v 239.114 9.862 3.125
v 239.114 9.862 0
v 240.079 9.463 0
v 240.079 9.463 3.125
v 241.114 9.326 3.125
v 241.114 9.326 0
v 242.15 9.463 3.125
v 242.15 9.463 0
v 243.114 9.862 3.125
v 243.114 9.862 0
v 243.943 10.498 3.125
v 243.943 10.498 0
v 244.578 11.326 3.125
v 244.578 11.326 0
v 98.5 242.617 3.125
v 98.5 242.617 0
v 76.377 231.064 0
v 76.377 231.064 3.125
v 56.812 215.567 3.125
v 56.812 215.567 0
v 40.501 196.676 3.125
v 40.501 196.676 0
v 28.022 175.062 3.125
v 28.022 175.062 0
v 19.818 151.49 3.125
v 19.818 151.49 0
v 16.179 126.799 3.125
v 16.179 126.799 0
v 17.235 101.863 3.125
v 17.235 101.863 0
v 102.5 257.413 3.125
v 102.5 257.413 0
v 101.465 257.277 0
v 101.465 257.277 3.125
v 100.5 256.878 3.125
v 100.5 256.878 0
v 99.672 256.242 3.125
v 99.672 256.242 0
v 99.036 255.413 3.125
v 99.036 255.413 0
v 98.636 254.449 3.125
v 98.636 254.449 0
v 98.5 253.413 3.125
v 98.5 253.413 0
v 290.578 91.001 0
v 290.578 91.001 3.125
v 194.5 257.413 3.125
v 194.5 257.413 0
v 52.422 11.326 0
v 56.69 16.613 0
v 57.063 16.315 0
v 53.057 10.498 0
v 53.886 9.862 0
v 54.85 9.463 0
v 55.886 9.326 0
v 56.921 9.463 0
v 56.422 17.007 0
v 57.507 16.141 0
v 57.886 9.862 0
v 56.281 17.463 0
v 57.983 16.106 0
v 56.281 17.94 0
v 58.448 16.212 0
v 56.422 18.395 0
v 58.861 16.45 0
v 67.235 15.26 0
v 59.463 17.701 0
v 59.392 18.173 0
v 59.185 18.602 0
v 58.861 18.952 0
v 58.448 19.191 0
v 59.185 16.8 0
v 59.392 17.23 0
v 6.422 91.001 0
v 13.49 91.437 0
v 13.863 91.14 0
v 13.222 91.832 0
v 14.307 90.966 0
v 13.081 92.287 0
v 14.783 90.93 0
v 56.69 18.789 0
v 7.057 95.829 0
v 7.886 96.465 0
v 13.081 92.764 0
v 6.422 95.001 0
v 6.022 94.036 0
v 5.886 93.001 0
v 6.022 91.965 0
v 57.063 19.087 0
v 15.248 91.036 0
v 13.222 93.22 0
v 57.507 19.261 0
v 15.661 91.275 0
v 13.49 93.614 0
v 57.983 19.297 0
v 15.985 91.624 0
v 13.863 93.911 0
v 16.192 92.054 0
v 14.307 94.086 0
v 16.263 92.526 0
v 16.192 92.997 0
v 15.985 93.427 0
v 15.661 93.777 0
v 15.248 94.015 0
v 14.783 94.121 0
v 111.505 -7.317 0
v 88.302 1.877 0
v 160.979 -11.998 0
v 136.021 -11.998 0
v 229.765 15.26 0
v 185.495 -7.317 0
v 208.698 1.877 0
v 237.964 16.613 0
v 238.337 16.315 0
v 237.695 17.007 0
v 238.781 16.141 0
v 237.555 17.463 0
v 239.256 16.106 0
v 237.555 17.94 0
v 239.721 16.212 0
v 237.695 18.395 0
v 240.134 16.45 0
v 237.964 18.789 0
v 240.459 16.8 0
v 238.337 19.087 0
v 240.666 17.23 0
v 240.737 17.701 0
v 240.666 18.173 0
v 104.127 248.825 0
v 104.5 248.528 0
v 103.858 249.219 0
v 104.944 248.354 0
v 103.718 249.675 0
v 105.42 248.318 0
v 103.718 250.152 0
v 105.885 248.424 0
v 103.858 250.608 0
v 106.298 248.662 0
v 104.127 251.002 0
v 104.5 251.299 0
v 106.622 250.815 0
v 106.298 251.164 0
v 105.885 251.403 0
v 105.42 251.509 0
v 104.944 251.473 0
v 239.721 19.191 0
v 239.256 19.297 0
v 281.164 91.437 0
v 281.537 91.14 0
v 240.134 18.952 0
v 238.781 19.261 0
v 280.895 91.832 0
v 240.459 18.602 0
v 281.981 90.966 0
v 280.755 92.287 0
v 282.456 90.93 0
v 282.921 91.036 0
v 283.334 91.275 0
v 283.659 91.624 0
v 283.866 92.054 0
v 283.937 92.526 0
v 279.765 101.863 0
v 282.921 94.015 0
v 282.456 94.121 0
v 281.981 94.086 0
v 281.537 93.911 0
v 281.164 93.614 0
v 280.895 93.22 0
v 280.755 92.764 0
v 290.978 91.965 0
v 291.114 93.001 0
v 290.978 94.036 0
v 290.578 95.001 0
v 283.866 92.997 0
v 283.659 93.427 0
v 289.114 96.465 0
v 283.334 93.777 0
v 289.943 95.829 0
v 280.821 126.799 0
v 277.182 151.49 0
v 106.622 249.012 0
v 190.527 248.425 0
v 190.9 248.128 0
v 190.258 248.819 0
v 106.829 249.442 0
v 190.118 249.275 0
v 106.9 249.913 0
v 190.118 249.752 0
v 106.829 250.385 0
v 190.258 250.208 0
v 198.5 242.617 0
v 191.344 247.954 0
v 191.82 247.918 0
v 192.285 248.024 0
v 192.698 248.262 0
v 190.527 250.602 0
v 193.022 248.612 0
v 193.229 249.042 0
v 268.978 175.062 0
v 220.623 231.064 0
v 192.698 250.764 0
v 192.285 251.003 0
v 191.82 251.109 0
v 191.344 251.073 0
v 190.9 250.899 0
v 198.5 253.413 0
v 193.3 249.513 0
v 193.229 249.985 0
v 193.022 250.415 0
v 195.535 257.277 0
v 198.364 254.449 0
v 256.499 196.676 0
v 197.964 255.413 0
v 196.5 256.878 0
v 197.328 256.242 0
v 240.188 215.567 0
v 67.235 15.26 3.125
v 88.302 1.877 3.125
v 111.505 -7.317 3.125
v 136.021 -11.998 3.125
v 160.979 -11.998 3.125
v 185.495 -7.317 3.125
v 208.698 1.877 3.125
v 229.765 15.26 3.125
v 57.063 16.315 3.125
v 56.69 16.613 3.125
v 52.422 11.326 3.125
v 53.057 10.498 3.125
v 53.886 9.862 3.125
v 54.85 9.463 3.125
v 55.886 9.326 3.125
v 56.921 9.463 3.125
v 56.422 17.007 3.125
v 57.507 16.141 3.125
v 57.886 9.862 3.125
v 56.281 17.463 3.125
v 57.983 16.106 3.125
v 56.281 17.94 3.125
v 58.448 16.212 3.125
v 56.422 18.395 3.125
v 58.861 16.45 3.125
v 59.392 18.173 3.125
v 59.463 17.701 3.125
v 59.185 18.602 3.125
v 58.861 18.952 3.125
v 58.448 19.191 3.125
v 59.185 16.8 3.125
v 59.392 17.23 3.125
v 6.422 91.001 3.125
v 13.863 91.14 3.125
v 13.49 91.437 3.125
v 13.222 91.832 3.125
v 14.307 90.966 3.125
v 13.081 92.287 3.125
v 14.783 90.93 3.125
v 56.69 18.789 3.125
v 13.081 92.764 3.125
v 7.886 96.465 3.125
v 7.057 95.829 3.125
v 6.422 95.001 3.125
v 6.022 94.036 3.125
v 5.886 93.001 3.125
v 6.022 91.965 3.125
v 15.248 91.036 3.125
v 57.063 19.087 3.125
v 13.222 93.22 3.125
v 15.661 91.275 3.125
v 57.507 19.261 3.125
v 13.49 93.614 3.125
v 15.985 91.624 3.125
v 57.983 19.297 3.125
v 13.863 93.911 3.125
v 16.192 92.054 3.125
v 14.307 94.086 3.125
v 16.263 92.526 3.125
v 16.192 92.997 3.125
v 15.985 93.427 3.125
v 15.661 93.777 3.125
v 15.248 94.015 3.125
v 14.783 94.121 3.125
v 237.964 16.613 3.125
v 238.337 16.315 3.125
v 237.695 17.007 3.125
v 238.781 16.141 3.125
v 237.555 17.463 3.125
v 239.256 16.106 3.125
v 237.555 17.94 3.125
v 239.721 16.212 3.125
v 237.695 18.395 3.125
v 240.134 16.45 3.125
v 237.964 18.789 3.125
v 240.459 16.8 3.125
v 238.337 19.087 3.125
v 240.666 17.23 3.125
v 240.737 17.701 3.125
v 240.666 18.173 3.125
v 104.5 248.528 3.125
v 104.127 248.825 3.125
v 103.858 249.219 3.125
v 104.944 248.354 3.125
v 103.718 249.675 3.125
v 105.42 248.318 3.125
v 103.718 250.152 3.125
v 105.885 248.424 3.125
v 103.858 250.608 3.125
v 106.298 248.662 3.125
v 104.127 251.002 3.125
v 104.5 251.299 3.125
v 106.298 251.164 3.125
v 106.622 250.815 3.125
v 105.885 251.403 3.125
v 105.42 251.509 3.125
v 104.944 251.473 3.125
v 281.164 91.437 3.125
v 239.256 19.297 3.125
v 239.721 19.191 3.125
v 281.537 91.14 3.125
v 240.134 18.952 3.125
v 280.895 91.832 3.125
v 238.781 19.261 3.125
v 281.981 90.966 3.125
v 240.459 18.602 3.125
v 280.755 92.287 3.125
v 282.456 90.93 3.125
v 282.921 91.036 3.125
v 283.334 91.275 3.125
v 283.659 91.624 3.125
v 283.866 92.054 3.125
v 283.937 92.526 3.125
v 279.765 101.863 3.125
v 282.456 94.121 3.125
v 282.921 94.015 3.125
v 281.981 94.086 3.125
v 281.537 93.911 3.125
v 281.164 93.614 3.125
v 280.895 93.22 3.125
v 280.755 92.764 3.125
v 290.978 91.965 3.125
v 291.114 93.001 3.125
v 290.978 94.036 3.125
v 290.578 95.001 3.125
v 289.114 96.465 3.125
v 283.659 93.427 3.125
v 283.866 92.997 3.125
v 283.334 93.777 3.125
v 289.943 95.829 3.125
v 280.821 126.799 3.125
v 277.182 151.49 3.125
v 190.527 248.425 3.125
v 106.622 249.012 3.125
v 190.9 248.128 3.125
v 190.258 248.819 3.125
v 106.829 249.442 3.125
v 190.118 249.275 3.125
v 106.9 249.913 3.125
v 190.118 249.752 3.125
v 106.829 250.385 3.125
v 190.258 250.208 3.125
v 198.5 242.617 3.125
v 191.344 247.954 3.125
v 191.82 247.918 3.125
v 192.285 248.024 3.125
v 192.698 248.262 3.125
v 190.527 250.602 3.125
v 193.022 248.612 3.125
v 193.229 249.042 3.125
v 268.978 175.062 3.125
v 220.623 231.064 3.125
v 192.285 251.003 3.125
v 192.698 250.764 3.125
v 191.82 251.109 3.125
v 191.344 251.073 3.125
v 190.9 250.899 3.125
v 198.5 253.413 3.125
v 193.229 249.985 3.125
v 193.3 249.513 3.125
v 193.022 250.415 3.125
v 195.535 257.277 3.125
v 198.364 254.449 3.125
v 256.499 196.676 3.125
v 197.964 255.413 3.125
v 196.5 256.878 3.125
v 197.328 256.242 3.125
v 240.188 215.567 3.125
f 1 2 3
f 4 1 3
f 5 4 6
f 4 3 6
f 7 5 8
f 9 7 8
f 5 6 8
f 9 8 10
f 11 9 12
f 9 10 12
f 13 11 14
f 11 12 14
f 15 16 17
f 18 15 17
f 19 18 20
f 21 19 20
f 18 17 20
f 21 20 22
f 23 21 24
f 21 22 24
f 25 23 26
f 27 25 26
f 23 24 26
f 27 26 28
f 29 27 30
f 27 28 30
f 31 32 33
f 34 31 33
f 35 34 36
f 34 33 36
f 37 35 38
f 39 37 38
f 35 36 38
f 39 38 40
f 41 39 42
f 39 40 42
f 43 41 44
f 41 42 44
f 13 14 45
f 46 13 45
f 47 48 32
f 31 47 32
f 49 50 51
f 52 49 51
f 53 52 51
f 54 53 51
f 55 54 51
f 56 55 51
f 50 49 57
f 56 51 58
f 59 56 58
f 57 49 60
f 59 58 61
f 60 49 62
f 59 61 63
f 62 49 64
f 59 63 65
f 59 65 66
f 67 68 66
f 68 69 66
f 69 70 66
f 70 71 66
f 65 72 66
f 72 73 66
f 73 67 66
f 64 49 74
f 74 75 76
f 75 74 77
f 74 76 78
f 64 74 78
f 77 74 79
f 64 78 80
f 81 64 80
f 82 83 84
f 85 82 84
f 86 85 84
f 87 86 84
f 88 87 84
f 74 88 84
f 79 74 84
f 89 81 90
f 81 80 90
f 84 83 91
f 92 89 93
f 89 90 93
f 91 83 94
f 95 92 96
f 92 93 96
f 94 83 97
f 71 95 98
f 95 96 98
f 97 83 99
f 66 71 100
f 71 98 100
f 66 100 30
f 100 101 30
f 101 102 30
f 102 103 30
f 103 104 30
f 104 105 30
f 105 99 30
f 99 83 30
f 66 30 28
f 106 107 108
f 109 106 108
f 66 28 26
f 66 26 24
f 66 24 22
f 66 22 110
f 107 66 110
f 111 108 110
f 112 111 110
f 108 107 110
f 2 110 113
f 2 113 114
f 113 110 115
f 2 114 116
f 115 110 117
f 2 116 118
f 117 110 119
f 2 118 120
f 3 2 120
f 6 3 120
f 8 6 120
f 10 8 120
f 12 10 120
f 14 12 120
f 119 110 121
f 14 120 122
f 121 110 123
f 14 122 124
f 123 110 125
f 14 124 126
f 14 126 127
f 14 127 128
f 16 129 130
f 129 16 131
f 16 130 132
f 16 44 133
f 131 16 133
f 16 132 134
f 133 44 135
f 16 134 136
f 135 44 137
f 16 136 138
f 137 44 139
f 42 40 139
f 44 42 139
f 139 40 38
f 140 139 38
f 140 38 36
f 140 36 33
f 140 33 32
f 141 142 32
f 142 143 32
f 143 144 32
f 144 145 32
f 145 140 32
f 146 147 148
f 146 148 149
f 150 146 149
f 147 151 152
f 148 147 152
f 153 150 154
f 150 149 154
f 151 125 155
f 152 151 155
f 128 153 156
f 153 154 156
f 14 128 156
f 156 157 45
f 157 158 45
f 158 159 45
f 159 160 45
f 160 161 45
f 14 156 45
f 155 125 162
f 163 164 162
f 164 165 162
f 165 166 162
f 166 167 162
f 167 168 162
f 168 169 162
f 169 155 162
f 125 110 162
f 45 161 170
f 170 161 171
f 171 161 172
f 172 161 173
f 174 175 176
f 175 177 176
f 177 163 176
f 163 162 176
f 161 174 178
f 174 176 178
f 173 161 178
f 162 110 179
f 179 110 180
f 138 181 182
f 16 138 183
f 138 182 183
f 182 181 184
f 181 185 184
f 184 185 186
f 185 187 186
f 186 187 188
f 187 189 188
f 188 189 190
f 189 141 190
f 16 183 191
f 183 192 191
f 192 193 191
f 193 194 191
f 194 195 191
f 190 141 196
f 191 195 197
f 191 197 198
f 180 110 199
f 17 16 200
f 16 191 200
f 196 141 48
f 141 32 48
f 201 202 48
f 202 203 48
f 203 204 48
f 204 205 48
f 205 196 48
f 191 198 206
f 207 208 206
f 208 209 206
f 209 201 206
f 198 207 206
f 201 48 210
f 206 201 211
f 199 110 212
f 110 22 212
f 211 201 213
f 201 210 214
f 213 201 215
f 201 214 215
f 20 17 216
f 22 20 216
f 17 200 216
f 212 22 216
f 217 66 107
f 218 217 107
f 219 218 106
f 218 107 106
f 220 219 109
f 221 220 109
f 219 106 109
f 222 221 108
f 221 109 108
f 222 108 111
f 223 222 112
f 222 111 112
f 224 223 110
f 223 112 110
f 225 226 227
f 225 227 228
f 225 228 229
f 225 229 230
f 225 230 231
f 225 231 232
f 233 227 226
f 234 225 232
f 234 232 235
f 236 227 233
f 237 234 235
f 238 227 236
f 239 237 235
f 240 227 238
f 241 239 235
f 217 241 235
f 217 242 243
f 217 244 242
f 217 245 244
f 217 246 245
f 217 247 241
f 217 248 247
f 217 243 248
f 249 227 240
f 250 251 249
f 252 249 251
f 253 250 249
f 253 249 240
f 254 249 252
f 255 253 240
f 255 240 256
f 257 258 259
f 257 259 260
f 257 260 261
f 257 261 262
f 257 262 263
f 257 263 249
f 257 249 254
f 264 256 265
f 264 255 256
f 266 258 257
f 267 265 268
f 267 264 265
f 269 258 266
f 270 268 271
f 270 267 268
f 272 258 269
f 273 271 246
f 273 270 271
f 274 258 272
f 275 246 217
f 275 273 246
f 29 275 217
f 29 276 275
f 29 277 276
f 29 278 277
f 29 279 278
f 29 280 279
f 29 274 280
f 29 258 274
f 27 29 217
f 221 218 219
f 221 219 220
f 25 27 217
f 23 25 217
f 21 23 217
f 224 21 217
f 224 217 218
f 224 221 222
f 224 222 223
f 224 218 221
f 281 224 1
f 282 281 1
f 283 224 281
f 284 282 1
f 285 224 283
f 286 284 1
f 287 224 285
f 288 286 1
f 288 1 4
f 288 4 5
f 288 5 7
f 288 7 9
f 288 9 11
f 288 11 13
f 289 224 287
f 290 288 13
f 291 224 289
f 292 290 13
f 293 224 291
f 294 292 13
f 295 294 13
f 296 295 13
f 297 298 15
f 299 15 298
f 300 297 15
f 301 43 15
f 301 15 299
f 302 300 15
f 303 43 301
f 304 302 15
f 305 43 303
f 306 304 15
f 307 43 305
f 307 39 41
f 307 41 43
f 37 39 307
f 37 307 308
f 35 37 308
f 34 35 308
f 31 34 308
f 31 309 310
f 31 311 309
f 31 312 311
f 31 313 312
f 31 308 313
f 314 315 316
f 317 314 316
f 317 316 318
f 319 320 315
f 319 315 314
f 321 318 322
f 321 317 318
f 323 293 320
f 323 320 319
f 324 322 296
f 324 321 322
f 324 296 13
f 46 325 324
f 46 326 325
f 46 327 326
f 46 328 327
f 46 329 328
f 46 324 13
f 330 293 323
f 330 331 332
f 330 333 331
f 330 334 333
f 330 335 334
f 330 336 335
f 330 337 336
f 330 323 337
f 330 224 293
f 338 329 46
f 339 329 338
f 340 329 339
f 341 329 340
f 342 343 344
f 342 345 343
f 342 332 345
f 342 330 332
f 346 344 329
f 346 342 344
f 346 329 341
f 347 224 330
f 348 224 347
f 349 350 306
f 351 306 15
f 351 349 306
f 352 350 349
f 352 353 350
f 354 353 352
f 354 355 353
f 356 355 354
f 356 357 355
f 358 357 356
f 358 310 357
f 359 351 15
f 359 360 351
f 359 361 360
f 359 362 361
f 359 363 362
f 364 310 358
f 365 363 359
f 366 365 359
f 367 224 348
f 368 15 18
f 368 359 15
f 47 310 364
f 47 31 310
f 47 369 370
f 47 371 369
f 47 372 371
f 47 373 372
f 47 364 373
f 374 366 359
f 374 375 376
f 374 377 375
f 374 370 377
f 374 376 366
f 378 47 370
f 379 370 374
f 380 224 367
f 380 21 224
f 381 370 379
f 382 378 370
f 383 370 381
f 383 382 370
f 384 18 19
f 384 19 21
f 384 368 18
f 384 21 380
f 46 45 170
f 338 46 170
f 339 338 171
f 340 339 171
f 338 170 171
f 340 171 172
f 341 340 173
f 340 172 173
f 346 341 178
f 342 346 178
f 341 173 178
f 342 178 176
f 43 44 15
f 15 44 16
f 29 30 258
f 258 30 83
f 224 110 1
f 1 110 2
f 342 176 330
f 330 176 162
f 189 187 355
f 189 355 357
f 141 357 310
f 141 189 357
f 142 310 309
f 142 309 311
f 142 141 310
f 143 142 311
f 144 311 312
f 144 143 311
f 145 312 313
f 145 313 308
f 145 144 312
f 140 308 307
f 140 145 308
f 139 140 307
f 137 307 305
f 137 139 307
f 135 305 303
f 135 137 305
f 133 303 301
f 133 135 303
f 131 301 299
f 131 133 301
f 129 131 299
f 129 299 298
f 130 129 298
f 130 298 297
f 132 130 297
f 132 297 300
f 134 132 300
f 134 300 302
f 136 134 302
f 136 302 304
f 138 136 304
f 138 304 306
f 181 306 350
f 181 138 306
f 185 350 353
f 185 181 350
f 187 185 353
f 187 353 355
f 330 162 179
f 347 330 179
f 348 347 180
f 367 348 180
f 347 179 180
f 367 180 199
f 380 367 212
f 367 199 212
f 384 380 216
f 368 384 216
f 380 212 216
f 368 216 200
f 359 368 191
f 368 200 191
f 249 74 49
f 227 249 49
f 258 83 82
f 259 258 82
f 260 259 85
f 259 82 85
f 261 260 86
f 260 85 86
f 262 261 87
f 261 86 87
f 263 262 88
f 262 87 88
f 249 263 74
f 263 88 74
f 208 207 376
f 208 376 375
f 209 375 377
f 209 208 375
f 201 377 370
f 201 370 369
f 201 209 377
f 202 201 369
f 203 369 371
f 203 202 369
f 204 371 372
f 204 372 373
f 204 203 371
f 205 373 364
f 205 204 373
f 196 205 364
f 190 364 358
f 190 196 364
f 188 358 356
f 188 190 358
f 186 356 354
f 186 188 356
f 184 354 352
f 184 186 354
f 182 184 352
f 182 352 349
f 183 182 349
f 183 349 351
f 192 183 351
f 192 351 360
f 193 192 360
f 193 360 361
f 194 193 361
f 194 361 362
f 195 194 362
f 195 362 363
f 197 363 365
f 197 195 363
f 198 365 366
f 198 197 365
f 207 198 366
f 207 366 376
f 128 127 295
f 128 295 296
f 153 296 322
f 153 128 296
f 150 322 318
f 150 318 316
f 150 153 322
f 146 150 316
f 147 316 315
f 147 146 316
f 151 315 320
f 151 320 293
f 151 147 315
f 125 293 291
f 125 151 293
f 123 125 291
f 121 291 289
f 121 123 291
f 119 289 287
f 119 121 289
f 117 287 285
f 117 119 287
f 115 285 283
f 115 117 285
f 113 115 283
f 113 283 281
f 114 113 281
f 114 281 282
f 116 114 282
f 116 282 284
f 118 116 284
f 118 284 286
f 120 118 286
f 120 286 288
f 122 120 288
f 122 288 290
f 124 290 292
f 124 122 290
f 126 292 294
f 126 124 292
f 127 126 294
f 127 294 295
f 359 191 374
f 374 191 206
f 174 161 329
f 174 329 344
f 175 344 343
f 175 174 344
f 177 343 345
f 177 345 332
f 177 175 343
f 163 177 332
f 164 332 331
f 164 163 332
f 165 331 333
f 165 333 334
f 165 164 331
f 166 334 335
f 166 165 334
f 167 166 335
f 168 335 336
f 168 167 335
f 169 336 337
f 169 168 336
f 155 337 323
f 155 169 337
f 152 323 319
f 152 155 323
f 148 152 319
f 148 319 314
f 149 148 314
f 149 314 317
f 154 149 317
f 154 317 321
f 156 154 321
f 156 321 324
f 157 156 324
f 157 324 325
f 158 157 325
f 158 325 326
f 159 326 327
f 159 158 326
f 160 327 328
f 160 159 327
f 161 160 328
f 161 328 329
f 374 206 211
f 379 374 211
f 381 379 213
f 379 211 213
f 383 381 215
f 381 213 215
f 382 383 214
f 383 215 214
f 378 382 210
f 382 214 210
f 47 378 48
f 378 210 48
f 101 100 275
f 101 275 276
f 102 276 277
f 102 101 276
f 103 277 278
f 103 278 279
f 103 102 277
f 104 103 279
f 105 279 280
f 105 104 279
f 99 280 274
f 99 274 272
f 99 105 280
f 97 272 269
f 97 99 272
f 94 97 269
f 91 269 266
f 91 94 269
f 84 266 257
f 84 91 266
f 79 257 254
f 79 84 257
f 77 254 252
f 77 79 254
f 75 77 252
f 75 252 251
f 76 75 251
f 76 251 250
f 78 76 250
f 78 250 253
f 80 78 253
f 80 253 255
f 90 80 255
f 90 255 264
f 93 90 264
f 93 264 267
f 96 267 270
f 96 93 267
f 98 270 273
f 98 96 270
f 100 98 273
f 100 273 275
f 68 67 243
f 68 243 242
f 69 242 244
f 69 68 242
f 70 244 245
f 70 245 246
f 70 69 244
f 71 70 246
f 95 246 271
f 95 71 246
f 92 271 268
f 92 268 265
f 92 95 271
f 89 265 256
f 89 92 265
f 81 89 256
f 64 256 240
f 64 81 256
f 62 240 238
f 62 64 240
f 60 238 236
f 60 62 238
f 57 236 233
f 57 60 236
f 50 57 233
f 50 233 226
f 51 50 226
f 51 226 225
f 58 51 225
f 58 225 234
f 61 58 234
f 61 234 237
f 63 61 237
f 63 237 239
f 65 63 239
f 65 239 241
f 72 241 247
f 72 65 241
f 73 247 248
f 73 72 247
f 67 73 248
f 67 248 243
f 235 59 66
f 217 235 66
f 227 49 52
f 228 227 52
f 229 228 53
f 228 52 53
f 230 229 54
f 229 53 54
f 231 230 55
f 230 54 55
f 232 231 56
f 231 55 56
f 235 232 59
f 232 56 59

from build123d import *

# Parameters (mm, degrees)
MODEL_R             = 1.6
BOSS_EXTRUDE1_DEPTH = 3.125


with BuildPart() as part:
    # Model → Boss-Extrude1 (new body)
    with BuildSketch(Plane.XY):
        with BuildLine():
            Line((194.5, 257.413429511), (102.5, 257.413429511))
            ThreePointArc((102.5, 257.413429511), (99.671572875, 256.241856636), (98.5, 253.413429511))
            Line((98.5, 253.413429511), (98.5, 242.617341429))
            ThreePointArc((98.5, 242.617341429), (33.751633999, 186.163429511), (17.235295135, 101.862743741))
            Line((17.235295135, 101.862743741), (7.885608595, 96.4646997))
            ThreePointArc((7.885608595, 96.4646997), (6.02190529, 94.035874265), (6.42150698, 91.000598085))
            Line((6.42150698, 91.000598085), (52.42150698, 11.326260937))
            ThreePointArc((52.42150698, 11.326260937), (54.850332414, 9.462557632), (57.885608595, 9.862159322))
            Line((57.885608595, 9.862159322), (67.235295135, 15.260203363))
            ThreePointArc((67.235295135, 15.260203363), (148.5, -12.586570489), (229.764704865, 15.260203363))
            Line((229.764704865, 15.260203363), (239.114391405, 9.862159322))
            ThreePointArc((239.114391405, 9.862159322), (242.149667586, 9.462557632), (244.57849302, 11.326260937))
            Line((244.57849302, 11.326260937), (290.57849302, 91.000598085))
            ThreePointArc((290.57849302, 91.000598085), (290.97809471, 94.035874265), (289.114391405, 96.4646997))
            Line((289.114391405, 96.4646997), (279.764704865, 101.862743741))
            ThreePointArc((279.764704865, 101.862743741), (263.248366001, 186.163429511), (198.5, 242.617341429))
            Line((198.5, 242.617341429), (198.5, 253.413429511))
            ThreePointArc((198.5, 253.413429511), (197.328427125, 256.241856636), (194.5, 257.413429511))
        make_face()
        with Locations((105.3, 249.913429511)):
            Circle(MODEL_R, mode=Mode.SUBTRACT)
        with Locations((191.7, 249.513429511)):
            Circle(MODEL_R, mode=Mode.SUBTRACT)
        with Locations((282.33689233, 92.525726954)):
            Circle(MODEL_R, mode=Mode.SUBTRACT)
        with Locations((239.13689233, 17.701132067)):
            Circle(MODEL_R, mode=Mode.SUBTRACT)
        with Locations((14.66310767, 92.525726954)):
            Circle(MODEL_R, mode=Mode.SUBTRACT)
        with Locations((57.86310767, 17.701132067)):
            Circle(MODEL_R, mode=Mode.SUBTRACT)
    extrude(amount=BOSS_EXTRUDE1_DEPTH)


solid = part.part
